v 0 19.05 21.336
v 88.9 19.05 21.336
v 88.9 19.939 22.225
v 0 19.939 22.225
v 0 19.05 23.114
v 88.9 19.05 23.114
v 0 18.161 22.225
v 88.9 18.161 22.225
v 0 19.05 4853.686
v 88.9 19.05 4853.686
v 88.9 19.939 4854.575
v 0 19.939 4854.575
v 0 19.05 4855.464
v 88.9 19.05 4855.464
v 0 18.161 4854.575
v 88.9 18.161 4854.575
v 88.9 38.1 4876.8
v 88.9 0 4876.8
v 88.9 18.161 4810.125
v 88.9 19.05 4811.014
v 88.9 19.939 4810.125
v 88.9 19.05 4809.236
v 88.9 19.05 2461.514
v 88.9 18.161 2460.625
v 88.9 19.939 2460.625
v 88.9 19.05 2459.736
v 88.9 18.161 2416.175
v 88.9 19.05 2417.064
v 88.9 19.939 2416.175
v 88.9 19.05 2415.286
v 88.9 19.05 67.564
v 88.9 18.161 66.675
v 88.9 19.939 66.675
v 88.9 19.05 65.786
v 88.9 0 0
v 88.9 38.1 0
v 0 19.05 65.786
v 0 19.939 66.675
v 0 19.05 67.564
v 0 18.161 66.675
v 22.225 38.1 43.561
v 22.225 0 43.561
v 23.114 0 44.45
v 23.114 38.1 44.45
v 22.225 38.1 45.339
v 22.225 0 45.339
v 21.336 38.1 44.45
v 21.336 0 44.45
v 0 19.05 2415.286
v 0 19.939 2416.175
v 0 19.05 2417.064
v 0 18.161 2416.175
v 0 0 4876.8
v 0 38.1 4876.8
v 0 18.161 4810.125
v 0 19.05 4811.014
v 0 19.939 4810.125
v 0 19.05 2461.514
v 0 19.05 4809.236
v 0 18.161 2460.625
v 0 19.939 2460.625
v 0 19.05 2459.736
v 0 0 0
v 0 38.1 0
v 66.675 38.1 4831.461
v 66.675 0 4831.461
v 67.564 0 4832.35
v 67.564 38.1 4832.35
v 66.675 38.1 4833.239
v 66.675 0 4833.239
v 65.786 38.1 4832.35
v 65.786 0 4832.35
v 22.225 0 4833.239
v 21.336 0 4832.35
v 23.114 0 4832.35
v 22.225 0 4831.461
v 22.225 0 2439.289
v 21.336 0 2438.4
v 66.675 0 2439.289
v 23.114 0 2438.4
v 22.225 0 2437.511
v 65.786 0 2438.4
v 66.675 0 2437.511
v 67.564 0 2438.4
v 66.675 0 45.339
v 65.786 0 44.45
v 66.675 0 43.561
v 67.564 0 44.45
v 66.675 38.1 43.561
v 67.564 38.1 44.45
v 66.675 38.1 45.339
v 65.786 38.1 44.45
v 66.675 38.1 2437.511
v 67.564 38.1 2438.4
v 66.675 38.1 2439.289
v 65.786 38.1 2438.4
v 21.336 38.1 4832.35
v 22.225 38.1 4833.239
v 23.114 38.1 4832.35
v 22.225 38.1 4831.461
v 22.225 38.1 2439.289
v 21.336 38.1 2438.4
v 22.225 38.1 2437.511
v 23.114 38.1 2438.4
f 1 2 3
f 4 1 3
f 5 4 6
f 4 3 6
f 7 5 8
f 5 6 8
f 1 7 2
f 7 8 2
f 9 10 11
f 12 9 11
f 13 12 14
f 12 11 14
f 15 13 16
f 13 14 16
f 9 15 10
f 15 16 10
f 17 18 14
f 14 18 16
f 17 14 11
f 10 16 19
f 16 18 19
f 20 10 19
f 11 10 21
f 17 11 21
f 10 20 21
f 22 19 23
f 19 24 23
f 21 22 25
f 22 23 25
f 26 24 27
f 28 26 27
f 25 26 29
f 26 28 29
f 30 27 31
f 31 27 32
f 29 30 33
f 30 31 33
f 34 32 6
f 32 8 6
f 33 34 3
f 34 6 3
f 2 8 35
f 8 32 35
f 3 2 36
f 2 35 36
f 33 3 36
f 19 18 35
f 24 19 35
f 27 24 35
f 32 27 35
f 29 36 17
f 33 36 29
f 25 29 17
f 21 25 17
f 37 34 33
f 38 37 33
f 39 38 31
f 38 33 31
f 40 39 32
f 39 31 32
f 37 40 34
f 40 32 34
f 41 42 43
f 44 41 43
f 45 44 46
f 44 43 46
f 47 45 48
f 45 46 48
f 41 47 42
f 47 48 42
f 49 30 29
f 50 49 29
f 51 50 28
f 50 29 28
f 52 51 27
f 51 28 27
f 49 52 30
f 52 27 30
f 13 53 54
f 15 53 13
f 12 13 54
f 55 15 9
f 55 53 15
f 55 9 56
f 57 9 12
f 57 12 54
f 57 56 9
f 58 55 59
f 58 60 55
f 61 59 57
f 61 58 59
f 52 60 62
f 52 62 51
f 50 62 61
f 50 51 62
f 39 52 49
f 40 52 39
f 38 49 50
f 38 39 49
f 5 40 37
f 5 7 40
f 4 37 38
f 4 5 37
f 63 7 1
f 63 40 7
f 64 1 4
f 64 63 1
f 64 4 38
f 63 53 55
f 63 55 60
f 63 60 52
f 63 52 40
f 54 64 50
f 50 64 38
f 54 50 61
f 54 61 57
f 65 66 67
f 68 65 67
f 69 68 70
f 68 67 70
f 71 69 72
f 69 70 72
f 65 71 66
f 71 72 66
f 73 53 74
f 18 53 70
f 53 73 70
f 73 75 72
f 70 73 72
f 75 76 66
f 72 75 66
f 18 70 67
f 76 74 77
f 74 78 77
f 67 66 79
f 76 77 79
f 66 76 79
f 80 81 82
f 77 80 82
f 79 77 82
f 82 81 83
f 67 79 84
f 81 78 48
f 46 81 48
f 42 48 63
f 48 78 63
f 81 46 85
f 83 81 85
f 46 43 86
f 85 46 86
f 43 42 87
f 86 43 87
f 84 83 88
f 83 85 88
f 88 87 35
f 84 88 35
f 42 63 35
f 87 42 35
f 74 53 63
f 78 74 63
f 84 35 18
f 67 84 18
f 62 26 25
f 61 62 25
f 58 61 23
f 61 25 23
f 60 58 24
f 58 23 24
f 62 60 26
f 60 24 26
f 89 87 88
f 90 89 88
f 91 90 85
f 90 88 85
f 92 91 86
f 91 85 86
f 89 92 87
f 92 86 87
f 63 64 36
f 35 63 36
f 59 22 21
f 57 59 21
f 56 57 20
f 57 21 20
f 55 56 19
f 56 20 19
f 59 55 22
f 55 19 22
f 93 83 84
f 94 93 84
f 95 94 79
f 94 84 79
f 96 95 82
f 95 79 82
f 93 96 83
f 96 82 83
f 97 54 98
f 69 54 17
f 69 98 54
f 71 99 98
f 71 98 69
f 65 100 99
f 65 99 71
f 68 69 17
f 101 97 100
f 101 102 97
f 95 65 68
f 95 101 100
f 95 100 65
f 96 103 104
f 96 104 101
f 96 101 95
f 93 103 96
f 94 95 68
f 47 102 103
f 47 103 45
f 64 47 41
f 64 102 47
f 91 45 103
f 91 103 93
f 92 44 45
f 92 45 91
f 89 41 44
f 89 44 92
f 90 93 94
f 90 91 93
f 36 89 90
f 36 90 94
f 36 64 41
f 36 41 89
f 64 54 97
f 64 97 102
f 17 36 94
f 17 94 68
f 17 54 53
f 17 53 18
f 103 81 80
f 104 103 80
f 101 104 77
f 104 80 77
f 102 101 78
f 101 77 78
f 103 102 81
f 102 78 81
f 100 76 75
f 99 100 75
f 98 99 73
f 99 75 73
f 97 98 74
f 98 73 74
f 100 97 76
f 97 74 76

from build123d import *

# Parameters (mm, degrees)
SKETCH1_W           = 88.9
SKETCH1_H           = 38.1
BOSS_EXTRUDE1_DEPTH = 4876.8
SKETCH3_R           = 0.889
CUT_EXTRUDE2_DEPTH  = 38.1
SKETCH5_R           = 0.889
CUT_EXTRUDE3_DEPTH  = 88.9


with BuildPart() as part:
    # Sketch1 → Boss-Extrude1 (new body)
    with BuildSketch(Plane.XY):
        with Locations((44.45, 19.05)):
            Rectangle(SKETCH1_W, SKETCH1_H)
    extrude(amount=BOSS_EXTRUDE1_DEPTH)

    # Sketch3 → Cut-Extrude2 (cut)
    with BuildSketch(Plane.XZ):
        with Locations(Location((66.675, 4832.35, 0), (0, 0, 270))):
            Circle(SKETCH3_R)
        with Locations(Location((22.225, 4832.35, 0), (0, 0, 270))):
            Circle(SKETCH3_R)
        with Locations(Location((22.225, 2438.4, 0), (0, 0, 270))):
            Circle(SKETCH3_R)
        with Locations(Location((66.675, 2438.4, 0), (0, 0, 270))):
            Circle(SKETCH3_R)
        with Locations(Location((66.675, 44.45, 0), (0, 0, 270))):
            Circle(SKETCH3_R)
        with Locations(Location((22.225, 44.45, 0), (0, 0, 270))):
            Circle(SKETCH3_R)
    extrude(amount=-CUT_EXTRUDE2_DEPTH, mode=Mode.SUBTRACT)

    # Sketch5 → Cut-Extrude3 (cut)
    with BuildSketch(Plane(origin=(88.9, 0, 0), x_dir=(0, 0, -1), z_dir=(1, 0, 0))):
        with Locations((-4854.575, 19.05)):
            Circle(SKETCH5_R)
        with Locations((-4810.125, 19.05)):
            Circle(SKETCH5_R)
        with Locations((-2460.625, 19.05)):
            Circle(SKETCH5_R)
        with Locations((-2416.175, 19.05)):
            Circle(SKETCH5_R)
        with Locations((-22.225, 19.05)):
            Circle(SKETCH5_R)
        with Locations((-66.675, 19.05)):
            Circle(SKETCH5_R)
    extrude(amount=-CUT_EXTRUDE3_DEPTH, mode=Mode.SUBTRACT)


solid = part.part
